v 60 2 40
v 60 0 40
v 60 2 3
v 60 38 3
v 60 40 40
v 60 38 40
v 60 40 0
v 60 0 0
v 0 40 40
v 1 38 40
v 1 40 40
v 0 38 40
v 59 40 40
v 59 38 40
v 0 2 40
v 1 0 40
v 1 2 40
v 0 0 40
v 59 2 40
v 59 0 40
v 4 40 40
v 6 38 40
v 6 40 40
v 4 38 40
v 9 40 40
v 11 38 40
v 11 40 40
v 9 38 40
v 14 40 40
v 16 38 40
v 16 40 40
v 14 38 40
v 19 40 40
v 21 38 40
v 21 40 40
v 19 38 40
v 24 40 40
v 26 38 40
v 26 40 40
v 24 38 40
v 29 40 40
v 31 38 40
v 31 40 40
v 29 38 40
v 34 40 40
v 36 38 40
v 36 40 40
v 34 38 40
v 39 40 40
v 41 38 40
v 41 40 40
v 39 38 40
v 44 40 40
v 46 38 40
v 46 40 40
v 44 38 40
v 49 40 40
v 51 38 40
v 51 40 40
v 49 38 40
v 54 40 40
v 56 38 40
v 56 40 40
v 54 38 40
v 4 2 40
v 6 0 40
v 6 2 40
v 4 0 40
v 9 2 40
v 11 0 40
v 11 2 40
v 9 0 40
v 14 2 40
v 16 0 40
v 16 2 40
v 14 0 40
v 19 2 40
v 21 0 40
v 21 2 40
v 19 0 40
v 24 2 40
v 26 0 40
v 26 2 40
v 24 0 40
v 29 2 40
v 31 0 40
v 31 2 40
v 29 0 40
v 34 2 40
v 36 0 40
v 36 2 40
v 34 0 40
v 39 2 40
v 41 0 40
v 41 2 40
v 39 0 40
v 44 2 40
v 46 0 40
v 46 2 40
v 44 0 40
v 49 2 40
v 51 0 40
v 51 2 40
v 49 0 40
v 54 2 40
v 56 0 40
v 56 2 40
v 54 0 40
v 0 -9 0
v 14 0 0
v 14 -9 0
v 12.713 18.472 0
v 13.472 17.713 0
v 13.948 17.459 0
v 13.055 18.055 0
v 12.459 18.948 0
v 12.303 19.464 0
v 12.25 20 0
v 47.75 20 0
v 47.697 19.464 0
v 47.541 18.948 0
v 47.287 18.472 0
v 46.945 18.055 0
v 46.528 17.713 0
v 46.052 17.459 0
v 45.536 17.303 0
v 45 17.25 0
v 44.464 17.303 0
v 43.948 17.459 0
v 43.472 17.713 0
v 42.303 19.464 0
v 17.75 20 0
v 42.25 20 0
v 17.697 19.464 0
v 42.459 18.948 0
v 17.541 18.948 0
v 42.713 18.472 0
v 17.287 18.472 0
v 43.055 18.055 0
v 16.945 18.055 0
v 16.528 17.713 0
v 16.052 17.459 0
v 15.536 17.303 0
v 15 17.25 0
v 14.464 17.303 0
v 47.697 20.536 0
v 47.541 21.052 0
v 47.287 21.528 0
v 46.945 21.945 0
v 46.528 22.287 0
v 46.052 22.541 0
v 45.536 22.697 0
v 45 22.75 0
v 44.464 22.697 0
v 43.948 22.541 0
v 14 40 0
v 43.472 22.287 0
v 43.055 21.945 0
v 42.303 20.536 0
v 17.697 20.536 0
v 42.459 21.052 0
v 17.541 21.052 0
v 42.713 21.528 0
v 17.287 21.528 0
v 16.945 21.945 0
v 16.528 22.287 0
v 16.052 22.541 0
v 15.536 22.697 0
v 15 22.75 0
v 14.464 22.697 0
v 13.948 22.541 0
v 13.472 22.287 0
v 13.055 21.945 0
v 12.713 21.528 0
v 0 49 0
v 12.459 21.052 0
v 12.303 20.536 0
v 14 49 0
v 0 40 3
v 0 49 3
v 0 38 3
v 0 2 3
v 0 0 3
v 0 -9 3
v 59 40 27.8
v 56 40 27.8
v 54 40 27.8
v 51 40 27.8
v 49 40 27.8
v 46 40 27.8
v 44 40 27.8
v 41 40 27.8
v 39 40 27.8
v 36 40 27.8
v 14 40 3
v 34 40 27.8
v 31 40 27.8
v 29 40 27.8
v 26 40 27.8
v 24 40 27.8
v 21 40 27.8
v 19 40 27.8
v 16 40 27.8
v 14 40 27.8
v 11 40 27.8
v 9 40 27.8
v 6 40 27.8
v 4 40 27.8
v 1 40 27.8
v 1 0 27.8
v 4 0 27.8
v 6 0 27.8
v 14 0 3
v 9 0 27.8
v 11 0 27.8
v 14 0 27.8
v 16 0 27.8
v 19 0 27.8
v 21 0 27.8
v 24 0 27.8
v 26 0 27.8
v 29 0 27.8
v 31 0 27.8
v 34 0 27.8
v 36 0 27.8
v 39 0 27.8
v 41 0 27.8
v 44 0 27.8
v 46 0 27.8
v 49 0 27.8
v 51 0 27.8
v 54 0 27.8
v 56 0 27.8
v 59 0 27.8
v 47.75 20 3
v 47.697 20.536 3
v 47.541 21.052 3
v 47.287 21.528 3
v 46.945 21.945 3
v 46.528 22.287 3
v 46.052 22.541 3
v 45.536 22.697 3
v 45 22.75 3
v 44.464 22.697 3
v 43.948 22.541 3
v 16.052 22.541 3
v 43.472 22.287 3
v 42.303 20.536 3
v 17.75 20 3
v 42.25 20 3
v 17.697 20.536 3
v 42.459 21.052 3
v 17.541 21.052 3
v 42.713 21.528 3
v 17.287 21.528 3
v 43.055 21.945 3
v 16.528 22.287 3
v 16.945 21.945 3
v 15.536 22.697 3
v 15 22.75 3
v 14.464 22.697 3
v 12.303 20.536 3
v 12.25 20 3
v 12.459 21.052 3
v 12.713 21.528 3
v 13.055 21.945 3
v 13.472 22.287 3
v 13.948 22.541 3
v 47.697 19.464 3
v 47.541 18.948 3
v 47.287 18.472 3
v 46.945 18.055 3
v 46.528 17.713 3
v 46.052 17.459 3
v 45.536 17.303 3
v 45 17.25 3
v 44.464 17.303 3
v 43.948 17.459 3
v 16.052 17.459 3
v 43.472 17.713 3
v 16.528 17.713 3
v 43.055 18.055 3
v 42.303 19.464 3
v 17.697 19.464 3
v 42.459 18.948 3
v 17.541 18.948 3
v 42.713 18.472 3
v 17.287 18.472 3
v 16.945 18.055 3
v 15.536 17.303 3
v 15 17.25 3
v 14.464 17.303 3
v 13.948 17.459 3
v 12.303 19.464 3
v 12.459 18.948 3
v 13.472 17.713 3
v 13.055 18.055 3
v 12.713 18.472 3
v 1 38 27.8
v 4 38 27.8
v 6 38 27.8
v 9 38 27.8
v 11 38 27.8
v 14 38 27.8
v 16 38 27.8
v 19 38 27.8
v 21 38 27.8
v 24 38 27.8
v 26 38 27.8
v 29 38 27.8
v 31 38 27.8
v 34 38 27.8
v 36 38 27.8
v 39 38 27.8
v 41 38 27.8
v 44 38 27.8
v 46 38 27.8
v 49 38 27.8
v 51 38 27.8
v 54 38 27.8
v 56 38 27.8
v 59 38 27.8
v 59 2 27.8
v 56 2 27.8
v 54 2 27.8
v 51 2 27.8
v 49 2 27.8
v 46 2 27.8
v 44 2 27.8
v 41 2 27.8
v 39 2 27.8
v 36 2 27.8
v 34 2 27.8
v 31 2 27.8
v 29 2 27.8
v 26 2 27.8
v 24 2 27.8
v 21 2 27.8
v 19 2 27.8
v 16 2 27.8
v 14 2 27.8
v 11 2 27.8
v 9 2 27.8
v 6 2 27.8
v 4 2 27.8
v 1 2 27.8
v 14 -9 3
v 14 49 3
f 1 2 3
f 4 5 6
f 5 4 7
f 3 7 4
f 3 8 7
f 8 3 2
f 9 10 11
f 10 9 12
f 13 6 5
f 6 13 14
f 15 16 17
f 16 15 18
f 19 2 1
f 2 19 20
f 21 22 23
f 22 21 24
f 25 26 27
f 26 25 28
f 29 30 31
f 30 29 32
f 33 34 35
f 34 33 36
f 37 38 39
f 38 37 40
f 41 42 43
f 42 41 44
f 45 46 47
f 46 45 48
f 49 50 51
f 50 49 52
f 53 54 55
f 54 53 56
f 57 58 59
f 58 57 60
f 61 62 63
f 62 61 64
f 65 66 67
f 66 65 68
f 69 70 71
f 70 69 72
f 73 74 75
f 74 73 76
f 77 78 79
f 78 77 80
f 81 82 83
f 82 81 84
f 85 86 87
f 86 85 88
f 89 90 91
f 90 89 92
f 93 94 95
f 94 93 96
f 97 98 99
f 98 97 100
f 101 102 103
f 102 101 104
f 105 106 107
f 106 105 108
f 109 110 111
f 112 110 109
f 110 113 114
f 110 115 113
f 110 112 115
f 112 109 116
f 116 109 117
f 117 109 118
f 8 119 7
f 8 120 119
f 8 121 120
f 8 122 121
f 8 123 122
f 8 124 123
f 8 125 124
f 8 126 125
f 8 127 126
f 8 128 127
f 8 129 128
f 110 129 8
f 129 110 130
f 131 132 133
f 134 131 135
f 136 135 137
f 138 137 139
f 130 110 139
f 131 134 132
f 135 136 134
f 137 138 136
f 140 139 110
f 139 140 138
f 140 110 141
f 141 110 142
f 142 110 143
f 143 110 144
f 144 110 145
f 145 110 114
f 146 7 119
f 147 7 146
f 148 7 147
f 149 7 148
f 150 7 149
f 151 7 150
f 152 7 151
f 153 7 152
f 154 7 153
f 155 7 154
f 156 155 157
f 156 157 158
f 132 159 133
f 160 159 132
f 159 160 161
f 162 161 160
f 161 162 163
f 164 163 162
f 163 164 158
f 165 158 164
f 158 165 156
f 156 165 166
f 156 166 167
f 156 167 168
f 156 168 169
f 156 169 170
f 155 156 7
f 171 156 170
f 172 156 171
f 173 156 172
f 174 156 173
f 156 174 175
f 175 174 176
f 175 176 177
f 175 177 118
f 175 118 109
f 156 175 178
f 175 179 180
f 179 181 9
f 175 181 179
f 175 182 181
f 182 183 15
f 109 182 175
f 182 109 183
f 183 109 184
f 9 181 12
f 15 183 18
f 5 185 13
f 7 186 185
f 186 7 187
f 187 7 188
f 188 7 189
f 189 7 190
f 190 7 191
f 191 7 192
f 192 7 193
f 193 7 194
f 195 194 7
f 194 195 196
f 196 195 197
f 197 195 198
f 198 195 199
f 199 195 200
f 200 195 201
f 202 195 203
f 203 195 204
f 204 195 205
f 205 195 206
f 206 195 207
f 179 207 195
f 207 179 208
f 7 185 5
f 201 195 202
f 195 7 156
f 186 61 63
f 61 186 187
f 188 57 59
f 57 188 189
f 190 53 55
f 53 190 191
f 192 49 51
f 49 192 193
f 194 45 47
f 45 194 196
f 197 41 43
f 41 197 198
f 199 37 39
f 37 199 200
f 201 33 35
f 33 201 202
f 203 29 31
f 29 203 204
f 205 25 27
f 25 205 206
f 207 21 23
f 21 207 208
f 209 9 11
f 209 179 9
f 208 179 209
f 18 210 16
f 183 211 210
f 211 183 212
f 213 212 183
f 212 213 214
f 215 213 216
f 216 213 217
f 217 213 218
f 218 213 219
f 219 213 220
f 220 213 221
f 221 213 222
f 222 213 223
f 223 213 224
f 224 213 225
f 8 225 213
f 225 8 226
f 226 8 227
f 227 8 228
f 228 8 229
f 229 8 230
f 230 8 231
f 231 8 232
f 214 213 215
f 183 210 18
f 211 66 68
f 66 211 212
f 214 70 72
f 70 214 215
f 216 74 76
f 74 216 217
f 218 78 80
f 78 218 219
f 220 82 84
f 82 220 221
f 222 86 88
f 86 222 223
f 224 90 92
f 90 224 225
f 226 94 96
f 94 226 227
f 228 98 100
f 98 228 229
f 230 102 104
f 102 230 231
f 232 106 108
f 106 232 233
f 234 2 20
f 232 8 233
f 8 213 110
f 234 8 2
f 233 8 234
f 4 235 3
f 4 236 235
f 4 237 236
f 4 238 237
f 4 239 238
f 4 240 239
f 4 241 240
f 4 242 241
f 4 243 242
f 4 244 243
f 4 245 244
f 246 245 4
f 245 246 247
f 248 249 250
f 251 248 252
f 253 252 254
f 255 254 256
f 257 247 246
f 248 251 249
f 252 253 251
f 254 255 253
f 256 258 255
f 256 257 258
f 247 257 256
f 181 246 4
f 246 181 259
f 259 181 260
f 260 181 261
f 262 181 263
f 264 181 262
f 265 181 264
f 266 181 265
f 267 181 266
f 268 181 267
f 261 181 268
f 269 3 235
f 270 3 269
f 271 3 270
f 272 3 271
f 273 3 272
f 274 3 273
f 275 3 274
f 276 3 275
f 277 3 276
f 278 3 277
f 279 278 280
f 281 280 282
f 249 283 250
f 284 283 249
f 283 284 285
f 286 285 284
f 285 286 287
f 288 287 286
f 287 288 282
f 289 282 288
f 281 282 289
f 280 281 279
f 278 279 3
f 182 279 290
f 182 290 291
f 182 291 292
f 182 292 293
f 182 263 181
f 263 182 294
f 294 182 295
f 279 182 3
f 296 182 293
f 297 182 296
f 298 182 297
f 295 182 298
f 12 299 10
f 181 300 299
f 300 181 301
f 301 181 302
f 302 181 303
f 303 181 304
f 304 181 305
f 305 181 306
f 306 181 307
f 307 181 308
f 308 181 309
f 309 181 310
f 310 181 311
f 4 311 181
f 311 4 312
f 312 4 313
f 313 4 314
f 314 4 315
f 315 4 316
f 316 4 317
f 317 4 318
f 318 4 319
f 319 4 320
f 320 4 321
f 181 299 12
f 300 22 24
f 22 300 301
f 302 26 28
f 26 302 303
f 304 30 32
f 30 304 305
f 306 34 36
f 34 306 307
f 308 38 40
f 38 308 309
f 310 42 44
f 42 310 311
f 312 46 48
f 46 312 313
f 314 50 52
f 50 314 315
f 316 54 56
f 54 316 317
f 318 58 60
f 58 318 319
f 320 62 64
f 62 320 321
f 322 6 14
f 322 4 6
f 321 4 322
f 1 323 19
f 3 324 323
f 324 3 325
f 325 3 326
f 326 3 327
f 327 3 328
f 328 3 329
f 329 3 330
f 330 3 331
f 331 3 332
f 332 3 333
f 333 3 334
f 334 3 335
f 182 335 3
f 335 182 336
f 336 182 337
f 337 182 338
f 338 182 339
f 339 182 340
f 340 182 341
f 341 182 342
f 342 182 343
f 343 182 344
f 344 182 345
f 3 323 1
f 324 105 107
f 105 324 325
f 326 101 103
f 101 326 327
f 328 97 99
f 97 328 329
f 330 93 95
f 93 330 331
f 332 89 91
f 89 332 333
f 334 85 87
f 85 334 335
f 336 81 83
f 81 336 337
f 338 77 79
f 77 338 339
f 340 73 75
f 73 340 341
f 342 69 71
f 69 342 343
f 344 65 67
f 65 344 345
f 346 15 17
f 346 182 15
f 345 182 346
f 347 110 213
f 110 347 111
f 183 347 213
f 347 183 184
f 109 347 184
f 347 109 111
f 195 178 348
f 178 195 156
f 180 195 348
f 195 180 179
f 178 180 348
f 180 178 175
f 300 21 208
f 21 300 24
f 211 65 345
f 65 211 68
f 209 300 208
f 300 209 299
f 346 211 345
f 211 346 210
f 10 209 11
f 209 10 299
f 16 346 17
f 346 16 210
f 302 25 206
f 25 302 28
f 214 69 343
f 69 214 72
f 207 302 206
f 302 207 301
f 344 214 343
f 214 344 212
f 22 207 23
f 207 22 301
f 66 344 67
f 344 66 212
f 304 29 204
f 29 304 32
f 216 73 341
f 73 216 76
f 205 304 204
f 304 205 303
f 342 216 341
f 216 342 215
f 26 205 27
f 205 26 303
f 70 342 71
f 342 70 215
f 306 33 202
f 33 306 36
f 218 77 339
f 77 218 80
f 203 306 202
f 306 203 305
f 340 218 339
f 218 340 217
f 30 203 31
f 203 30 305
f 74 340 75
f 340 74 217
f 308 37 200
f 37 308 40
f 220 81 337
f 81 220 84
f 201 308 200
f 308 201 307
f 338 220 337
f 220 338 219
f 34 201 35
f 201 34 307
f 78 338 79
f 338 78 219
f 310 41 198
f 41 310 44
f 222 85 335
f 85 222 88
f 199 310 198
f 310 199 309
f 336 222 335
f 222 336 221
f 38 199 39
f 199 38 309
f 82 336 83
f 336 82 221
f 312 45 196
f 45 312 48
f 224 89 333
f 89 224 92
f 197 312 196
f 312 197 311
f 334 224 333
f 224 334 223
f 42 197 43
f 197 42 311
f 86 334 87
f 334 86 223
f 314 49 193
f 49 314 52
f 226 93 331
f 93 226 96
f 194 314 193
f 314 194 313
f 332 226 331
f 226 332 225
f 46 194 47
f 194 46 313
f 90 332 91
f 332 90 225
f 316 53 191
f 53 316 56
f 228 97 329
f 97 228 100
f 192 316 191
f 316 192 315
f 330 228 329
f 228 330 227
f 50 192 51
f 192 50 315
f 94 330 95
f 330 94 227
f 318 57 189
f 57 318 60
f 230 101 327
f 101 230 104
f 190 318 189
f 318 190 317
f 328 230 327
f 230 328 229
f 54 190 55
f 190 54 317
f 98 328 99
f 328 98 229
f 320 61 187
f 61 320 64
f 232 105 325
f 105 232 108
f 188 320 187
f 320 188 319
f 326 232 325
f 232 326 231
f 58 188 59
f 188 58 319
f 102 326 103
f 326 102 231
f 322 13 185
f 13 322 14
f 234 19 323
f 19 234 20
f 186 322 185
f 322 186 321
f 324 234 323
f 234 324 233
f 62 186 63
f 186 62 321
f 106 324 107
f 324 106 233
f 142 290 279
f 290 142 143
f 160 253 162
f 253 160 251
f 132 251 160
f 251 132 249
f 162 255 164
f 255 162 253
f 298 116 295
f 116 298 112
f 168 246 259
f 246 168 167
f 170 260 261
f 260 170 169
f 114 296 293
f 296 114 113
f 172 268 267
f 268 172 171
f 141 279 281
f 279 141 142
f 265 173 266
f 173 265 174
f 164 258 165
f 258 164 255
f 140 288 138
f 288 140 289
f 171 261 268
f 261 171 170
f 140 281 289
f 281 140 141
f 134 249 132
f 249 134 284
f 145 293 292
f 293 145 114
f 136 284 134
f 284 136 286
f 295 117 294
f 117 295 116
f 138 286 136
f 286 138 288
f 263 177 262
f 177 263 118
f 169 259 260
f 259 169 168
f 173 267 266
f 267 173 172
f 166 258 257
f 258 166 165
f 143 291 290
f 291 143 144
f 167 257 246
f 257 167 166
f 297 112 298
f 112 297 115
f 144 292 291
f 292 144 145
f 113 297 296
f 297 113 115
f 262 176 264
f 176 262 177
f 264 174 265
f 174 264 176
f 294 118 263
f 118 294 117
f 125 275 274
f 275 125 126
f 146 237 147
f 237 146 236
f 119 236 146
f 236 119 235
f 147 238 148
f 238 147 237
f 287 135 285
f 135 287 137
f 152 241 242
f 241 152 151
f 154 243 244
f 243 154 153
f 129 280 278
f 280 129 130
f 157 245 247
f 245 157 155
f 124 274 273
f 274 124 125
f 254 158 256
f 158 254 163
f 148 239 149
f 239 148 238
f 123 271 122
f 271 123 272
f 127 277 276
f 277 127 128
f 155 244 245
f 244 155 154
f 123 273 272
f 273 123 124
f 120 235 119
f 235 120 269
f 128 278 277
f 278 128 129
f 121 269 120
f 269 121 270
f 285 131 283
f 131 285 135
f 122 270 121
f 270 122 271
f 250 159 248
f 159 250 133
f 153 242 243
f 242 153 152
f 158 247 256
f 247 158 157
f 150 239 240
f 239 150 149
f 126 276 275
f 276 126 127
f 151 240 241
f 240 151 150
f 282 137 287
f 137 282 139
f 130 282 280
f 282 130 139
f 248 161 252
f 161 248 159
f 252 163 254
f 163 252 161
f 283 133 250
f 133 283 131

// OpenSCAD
$fn = 32;

// ----------------------------------------------------------------------
// Cable duct: 60 x 40 x 40 mm, 12 fingers
// ----------------------------------------------------------------------

// --- parameters (mm) ---
tray_len = 60;            // duct length, X
tray_w = 40;              // duct width, Y
tray_h = 40;              // duct height, Z
tray_t = 2;               // side wall thickness
floor_t = 3;              // floor thickness
slot_w = 3;               // finger slot width
slot_h = 24.8;            // finger slot height
fingers = 12;             // number of finger slots per side
pitch = 5;                // finger pitch
hole_d = 5.5;             // floor mounting hole
hole_n = 2;               // mounting holes in the floor
ear_w = 10;               // mounting ear width
ear_l = 14;               // mounting ear length

module shell() {
  difference() {
    cube([tray_len, tray_w, tray_h]);
    /* open top channel */
    translate([-tray_t - 1, tray_t, floor_t])
      cube([tray_len + 2 * tray_t + 2, tray_w - 2 * tray_t, tray_h + 1]);
  }
}

module ears() {
  translate([0, -ear_w + 1, 0]) cube([ear_l, ear_w, floor_t]);
  translate([0, tray_w - 1, 0]) cube([ear_l, ear_w, floor_t]);
}

difference() {
  union() {
    shell();
    ears();
  }
  /* finger slots cut through both side walls */
  for (i = [0 : fingers - 1]) translate([pitch / 2 + i * pitch - slot_w / 2, -1, floor_t + slot_h]) cube([slot_w, tray_w + 2, tray_h]);
  for (i = [0 : hole_n - 1]) translate([(tray_len / hole_n) * (i + 0.5), tray_w / 2, -1]) cylinder(h = floor_t + 2, d = hole_d);
}
